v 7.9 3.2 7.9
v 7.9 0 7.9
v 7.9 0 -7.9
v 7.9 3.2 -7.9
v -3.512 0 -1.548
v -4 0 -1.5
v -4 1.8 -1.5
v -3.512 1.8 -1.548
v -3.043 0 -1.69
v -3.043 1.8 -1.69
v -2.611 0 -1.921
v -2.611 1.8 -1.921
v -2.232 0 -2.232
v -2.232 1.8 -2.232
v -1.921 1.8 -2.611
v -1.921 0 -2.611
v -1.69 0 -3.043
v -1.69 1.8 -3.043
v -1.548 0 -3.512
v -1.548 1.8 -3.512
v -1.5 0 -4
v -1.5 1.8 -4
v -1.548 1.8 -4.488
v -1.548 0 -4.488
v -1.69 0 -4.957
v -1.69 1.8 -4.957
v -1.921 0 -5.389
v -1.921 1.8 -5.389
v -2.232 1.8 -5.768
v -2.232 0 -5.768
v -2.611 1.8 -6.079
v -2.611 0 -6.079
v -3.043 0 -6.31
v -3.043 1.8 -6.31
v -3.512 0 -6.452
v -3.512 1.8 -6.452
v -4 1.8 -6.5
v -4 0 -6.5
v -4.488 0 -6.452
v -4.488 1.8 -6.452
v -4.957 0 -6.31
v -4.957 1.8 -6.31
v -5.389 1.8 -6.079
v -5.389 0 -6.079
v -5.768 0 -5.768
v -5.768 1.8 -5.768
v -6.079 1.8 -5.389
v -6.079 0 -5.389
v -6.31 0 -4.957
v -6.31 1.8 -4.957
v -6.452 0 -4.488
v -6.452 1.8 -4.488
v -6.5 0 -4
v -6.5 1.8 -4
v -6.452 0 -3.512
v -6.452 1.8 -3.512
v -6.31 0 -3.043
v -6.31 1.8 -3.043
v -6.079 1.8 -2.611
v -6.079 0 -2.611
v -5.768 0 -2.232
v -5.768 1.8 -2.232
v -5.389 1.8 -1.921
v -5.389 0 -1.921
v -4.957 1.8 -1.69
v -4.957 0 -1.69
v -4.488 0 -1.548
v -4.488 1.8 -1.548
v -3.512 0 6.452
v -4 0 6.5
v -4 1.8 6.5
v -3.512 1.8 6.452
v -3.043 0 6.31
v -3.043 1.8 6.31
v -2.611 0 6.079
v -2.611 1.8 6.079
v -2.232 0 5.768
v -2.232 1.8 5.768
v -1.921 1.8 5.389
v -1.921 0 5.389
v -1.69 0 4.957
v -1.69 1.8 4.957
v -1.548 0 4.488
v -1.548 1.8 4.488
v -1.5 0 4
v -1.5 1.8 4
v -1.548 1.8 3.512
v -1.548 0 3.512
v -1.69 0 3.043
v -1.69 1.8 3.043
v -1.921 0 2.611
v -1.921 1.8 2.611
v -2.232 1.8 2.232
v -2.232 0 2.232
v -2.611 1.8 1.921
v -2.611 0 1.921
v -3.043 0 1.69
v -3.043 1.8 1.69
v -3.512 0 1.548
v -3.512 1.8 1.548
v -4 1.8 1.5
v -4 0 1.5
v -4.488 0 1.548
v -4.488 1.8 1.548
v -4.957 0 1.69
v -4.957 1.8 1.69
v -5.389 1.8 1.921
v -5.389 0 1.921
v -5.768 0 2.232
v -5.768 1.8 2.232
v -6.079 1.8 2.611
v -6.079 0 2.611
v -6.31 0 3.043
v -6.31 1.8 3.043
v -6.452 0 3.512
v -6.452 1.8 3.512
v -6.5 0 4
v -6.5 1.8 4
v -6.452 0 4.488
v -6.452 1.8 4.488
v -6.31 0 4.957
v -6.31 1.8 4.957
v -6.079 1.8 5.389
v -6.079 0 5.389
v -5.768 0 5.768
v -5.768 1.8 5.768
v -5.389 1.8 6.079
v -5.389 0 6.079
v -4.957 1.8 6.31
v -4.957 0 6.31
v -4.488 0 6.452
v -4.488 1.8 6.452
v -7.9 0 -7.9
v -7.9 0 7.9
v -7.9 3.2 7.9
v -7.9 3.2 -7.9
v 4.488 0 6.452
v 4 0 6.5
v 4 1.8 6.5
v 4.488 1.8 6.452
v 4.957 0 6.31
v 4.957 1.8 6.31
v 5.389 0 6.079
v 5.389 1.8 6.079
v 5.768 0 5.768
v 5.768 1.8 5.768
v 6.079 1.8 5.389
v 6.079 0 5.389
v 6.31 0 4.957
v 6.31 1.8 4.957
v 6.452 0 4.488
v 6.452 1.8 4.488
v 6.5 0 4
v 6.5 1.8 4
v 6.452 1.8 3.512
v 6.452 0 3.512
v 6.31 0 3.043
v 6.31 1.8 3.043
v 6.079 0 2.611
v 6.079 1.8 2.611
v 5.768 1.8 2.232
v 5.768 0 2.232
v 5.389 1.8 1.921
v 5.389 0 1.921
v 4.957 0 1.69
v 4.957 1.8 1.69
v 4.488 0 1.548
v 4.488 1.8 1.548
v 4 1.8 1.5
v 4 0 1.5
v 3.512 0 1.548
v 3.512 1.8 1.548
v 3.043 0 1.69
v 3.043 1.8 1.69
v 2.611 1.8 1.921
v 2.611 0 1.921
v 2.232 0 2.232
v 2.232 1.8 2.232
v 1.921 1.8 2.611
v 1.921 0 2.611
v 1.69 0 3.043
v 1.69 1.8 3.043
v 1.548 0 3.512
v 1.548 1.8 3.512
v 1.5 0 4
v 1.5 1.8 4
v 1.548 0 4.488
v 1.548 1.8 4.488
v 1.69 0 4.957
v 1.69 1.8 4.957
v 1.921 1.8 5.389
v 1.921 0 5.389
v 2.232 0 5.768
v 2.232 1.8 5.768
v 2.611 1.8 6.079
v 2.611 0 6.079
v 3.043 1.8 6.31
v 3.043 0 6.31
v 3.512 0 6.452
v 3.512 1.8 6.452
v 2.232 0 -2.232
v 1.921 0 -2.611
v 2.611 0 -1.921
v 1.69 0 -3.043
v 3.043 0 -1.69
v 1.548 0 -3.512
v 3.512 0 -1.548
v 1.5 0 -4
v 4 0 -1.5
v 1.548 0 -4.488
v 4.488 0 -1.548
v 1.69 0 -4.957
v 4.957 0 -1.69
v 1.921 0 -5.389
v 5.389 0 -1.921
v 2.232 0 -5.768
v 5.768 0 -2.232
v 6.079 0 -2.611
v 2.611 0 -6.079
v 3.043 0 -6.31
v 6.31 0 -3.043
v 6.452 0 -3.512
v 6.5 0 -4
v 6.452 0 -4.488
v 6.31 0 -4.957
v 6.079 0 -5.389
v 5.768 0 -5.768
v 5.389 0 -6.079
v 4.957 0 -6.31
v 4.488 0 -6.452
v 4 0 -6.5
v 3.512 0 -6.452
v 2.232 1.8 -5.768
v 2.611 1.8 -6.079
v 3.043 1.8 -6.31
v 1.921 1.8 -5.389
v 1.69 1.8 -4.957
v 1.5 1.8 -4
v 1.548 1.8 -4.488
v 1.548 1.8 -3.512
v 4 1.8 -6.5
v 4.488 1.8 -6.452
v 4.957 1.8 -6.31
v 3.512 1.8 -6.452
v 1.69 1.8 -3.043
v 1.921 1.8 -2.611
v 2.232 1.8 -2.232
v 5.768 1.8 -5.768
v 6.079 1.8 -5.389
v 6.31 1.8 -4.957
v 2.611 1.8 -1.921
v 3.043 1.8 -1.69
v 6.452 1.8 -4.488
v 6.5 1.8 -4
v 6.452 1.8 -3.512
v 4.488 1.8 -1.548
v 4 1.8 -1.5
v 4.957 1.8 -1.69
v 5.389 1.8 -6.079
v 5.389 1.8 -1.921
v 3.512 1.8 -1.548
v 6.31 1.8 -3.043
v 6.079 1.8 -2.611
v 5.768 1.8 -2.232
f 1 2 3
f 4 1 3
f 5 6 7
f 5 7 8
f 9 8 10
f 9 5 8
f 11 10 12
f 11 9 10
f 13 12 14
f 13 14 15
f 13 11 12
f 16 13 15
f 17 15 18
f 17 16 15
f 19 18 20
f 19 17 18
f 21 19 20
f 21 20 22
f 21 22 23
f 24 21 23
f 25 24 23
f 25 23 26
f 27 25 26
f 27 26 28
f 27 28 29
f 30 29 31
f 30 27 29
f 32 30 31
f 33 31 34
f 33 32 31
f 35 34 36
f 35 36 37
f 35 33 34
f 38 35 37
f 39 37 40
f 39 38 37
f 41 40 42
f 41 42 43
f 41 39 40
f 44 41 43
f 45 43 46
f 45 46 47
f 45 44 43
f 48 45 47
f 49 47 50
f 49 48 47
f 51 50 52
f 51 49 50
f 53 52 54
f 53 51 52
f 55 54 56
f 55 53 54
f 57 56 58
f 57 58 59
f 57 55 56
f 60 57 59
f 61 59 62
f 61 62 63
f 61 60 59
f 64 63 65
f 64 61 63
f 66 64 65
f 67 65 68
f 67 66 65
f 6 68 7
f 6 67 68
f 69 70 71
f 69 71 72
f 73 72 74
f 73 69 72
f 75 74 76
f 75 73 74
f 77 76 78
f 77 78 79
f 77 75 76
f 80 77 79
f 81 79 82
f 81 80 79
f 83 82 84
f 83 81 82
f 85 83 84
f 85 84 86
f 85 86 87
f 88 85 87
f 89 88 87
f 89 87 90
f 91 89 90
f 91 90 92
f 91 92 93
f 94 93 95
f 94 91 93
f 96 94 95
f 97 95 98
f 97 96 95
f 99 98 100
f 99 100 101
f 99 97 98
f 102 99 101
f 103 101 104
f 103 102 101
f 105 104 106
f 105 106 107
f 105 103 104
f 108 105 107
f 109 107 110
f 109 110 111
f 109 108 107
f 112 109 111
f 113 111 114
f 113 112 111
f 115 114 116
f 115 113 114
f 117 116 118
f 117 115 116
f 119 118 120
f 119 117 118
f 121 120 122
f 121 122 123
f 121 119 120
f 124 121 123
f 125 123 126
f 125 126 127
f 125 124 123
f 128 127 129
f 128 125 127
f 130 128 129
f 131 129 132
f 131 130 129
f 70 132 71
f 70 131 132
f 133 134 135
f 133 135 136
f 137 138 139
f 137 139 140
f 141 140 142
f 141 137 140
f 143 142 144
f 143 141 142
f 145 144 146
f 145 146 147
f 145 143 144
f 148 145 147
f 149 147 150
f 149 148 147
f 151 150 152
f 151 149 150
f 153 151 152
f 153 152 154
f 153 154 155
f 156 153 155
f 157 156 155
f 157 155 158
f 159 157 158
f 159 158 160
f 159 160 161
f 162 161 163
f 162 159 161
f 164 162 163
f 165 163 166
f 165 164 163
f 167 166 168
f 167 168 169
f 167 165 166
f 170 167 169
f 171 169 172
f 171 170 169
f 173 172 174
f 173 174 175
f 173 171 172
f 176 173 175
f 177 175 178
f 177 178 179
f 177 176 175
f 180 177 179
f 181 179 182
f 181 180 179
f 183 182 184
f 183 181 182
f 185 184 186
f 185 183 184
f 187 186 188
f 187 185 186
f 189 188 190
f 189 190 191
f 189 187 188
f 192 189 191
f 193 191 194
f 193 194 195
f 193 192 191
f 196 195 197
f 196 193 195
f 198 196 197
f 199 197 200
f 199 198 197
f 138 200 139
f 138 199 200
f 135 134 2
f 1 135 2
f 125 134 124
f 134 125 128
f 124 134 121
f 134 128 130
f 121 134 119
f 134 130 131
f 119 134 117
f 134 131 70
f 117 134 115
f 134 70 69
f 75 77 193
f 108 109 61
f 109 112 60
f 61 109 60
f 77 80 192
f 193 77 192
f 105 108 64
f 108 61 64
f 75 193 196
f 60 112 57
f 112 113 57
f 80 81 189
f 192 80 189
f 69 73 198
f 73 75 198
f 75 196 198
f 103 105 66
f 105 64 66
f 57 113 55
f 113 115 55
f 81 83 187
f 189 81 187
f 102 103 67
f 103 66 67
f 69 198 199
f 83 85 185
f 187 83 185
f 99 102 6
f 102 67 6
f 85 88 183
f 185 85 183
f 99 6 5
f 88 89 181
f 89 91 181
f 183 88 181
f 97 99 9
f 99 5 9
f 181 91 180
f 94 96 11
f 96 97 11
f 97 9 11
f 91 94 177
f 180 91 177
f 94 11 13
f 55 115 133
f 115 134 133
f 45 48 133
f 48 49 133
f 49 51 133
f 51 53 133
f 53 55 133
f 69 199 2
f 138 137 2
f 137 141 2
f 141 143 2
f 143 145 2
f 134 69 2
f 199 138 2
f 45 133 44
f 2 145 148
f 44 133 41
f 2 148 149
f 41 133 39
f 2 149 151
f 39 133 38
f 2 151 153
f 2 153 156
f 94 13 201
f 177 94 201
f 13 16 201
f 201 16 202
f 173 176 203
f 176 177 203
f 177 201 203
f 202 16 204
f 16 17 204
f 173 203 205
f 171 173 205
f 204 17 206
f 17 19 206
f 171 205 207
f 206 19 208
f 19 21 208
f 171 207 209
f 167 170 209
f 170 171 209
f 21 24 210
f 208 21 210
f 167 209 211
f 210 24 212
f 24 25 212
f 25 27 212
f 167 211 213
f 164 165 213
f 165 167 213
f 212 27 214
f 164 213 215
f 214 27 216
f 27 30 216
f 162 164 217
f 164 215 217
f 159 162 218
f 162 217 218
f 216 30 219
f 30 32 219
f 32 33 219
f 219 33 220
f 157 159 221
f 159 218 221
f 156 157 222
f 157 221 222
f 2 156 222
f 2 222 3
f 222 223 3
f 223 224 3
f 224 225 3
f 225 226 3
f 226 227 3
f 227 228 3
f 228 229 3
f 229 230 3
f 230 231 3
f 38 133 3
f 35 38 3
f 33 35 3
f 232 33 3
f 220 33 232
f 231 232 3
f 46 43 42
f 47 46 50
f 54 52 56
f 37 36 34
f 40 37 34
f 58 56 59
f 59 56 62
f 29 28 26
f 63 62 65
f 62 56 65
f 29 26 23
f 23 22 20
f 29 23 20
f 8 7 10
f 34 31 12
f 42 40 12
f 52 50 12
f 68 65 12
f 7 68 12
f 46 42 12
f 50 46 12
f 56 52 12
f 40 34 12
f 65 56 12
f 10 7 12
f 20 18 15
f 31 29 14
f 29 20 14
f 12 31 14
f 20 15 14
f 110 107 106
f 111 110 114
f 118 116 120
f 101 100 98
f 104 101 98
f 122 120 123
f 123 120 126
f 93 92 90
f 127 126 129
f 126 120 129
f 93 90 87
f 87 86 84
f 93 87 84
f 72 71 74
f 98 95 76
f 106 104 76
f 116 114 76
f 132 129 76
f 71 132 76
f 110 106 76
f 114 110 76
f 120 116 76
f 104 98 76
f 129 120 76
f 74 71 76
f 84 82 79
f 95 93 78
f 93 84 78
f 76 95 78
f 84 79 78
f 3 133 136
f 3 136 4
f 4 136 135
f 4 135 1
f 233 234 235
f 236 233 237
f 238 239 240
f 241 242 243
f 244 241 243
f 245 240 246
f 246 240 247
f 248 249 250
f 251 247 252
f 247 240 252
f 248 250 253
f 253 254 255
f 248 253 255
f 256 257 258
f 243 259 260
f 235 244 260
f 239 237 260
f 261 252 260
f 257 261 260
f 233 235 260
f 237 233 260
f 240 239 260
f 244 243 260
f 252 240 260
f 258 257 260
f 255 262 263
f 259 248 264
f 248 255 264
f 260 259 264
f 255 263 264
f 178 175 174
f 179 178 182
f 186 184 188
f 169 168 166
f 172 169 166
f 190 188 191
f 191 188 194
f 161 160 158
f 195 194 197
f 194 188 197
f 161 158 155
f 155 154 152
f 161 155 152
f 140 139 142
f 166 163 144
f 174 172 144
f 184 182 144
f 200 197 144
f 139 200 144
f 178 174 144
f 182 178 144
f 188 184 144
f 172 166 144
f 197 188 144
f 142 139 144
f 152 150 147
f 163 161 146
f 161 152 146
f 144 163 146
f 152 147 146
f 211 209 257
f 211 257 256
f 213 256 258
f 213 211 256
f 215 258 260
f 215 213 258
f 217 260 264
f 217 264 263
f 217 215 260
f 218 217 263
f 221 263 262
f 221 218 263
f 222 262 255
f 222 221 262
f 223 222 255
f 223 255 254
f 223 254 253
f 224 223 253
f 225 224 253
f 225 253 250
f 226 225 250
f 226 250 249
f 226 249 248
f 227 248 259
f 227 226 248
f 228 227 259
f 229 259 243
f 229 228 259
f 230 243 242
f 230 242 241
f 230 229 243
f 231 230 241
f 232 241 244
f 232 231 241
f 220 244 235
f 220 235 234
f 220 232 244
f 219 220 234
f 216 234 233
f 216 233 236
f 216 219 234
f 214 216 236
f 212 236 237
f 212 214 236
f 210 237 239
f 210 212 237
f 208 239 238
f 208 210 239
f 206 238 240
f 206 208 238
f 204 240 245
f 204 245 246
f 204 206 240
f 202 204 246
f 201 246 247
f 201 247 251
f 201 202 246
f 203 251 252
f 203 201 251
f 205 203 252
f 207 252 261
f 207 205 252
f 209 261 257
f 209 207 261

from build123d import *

# Parameters (mm, degrees)
SKETCH_1_W          = 15.8
SKETCH_1_H          = 15.8
EXTRUDE_1_DEPTH     = 3.2
SKETCH_1_5_R        = 2.5
CUT_EXTRUDE_1_DEPTH = 1.8


with BuildPart() as part:
    # Эскиз1 → Бобышка-Вытянуть1 (new body)
    with BuildSketch(Plane(origin=(0, 0, 0), x_dir=(1, 0, 0), z_dir=(0, 1, 0))):
        Rectangle(SKETCH_1_W, SKETCH_1_H)
    extrude(amount=EXTRUDE_1_DEPTH)

    # Эскиз1<5> → Вырез-Вытянуть1 (cut)
    with BuildSketch(Plane(origin=(0, 0, 0), x_dir=(1, 0, 0), z_dir=(0, 1, 0))):
        with Locations((4, 4)):
            Circle(SKETCH_1_5_R)
        with Locations((-4, 4)):
            Circle(SKETCH_1_5_R)
        with Locations((-4, -4)):
            Circle(SKETCH_1_5_R)
        with Locations((4, -4)):
            Circle(SKETCH_1_5_R)
    extrude(amount=CUT_EXTRUDE_1_DEPTH, mode=Mode.SUBTRACT)


solid = part.part
